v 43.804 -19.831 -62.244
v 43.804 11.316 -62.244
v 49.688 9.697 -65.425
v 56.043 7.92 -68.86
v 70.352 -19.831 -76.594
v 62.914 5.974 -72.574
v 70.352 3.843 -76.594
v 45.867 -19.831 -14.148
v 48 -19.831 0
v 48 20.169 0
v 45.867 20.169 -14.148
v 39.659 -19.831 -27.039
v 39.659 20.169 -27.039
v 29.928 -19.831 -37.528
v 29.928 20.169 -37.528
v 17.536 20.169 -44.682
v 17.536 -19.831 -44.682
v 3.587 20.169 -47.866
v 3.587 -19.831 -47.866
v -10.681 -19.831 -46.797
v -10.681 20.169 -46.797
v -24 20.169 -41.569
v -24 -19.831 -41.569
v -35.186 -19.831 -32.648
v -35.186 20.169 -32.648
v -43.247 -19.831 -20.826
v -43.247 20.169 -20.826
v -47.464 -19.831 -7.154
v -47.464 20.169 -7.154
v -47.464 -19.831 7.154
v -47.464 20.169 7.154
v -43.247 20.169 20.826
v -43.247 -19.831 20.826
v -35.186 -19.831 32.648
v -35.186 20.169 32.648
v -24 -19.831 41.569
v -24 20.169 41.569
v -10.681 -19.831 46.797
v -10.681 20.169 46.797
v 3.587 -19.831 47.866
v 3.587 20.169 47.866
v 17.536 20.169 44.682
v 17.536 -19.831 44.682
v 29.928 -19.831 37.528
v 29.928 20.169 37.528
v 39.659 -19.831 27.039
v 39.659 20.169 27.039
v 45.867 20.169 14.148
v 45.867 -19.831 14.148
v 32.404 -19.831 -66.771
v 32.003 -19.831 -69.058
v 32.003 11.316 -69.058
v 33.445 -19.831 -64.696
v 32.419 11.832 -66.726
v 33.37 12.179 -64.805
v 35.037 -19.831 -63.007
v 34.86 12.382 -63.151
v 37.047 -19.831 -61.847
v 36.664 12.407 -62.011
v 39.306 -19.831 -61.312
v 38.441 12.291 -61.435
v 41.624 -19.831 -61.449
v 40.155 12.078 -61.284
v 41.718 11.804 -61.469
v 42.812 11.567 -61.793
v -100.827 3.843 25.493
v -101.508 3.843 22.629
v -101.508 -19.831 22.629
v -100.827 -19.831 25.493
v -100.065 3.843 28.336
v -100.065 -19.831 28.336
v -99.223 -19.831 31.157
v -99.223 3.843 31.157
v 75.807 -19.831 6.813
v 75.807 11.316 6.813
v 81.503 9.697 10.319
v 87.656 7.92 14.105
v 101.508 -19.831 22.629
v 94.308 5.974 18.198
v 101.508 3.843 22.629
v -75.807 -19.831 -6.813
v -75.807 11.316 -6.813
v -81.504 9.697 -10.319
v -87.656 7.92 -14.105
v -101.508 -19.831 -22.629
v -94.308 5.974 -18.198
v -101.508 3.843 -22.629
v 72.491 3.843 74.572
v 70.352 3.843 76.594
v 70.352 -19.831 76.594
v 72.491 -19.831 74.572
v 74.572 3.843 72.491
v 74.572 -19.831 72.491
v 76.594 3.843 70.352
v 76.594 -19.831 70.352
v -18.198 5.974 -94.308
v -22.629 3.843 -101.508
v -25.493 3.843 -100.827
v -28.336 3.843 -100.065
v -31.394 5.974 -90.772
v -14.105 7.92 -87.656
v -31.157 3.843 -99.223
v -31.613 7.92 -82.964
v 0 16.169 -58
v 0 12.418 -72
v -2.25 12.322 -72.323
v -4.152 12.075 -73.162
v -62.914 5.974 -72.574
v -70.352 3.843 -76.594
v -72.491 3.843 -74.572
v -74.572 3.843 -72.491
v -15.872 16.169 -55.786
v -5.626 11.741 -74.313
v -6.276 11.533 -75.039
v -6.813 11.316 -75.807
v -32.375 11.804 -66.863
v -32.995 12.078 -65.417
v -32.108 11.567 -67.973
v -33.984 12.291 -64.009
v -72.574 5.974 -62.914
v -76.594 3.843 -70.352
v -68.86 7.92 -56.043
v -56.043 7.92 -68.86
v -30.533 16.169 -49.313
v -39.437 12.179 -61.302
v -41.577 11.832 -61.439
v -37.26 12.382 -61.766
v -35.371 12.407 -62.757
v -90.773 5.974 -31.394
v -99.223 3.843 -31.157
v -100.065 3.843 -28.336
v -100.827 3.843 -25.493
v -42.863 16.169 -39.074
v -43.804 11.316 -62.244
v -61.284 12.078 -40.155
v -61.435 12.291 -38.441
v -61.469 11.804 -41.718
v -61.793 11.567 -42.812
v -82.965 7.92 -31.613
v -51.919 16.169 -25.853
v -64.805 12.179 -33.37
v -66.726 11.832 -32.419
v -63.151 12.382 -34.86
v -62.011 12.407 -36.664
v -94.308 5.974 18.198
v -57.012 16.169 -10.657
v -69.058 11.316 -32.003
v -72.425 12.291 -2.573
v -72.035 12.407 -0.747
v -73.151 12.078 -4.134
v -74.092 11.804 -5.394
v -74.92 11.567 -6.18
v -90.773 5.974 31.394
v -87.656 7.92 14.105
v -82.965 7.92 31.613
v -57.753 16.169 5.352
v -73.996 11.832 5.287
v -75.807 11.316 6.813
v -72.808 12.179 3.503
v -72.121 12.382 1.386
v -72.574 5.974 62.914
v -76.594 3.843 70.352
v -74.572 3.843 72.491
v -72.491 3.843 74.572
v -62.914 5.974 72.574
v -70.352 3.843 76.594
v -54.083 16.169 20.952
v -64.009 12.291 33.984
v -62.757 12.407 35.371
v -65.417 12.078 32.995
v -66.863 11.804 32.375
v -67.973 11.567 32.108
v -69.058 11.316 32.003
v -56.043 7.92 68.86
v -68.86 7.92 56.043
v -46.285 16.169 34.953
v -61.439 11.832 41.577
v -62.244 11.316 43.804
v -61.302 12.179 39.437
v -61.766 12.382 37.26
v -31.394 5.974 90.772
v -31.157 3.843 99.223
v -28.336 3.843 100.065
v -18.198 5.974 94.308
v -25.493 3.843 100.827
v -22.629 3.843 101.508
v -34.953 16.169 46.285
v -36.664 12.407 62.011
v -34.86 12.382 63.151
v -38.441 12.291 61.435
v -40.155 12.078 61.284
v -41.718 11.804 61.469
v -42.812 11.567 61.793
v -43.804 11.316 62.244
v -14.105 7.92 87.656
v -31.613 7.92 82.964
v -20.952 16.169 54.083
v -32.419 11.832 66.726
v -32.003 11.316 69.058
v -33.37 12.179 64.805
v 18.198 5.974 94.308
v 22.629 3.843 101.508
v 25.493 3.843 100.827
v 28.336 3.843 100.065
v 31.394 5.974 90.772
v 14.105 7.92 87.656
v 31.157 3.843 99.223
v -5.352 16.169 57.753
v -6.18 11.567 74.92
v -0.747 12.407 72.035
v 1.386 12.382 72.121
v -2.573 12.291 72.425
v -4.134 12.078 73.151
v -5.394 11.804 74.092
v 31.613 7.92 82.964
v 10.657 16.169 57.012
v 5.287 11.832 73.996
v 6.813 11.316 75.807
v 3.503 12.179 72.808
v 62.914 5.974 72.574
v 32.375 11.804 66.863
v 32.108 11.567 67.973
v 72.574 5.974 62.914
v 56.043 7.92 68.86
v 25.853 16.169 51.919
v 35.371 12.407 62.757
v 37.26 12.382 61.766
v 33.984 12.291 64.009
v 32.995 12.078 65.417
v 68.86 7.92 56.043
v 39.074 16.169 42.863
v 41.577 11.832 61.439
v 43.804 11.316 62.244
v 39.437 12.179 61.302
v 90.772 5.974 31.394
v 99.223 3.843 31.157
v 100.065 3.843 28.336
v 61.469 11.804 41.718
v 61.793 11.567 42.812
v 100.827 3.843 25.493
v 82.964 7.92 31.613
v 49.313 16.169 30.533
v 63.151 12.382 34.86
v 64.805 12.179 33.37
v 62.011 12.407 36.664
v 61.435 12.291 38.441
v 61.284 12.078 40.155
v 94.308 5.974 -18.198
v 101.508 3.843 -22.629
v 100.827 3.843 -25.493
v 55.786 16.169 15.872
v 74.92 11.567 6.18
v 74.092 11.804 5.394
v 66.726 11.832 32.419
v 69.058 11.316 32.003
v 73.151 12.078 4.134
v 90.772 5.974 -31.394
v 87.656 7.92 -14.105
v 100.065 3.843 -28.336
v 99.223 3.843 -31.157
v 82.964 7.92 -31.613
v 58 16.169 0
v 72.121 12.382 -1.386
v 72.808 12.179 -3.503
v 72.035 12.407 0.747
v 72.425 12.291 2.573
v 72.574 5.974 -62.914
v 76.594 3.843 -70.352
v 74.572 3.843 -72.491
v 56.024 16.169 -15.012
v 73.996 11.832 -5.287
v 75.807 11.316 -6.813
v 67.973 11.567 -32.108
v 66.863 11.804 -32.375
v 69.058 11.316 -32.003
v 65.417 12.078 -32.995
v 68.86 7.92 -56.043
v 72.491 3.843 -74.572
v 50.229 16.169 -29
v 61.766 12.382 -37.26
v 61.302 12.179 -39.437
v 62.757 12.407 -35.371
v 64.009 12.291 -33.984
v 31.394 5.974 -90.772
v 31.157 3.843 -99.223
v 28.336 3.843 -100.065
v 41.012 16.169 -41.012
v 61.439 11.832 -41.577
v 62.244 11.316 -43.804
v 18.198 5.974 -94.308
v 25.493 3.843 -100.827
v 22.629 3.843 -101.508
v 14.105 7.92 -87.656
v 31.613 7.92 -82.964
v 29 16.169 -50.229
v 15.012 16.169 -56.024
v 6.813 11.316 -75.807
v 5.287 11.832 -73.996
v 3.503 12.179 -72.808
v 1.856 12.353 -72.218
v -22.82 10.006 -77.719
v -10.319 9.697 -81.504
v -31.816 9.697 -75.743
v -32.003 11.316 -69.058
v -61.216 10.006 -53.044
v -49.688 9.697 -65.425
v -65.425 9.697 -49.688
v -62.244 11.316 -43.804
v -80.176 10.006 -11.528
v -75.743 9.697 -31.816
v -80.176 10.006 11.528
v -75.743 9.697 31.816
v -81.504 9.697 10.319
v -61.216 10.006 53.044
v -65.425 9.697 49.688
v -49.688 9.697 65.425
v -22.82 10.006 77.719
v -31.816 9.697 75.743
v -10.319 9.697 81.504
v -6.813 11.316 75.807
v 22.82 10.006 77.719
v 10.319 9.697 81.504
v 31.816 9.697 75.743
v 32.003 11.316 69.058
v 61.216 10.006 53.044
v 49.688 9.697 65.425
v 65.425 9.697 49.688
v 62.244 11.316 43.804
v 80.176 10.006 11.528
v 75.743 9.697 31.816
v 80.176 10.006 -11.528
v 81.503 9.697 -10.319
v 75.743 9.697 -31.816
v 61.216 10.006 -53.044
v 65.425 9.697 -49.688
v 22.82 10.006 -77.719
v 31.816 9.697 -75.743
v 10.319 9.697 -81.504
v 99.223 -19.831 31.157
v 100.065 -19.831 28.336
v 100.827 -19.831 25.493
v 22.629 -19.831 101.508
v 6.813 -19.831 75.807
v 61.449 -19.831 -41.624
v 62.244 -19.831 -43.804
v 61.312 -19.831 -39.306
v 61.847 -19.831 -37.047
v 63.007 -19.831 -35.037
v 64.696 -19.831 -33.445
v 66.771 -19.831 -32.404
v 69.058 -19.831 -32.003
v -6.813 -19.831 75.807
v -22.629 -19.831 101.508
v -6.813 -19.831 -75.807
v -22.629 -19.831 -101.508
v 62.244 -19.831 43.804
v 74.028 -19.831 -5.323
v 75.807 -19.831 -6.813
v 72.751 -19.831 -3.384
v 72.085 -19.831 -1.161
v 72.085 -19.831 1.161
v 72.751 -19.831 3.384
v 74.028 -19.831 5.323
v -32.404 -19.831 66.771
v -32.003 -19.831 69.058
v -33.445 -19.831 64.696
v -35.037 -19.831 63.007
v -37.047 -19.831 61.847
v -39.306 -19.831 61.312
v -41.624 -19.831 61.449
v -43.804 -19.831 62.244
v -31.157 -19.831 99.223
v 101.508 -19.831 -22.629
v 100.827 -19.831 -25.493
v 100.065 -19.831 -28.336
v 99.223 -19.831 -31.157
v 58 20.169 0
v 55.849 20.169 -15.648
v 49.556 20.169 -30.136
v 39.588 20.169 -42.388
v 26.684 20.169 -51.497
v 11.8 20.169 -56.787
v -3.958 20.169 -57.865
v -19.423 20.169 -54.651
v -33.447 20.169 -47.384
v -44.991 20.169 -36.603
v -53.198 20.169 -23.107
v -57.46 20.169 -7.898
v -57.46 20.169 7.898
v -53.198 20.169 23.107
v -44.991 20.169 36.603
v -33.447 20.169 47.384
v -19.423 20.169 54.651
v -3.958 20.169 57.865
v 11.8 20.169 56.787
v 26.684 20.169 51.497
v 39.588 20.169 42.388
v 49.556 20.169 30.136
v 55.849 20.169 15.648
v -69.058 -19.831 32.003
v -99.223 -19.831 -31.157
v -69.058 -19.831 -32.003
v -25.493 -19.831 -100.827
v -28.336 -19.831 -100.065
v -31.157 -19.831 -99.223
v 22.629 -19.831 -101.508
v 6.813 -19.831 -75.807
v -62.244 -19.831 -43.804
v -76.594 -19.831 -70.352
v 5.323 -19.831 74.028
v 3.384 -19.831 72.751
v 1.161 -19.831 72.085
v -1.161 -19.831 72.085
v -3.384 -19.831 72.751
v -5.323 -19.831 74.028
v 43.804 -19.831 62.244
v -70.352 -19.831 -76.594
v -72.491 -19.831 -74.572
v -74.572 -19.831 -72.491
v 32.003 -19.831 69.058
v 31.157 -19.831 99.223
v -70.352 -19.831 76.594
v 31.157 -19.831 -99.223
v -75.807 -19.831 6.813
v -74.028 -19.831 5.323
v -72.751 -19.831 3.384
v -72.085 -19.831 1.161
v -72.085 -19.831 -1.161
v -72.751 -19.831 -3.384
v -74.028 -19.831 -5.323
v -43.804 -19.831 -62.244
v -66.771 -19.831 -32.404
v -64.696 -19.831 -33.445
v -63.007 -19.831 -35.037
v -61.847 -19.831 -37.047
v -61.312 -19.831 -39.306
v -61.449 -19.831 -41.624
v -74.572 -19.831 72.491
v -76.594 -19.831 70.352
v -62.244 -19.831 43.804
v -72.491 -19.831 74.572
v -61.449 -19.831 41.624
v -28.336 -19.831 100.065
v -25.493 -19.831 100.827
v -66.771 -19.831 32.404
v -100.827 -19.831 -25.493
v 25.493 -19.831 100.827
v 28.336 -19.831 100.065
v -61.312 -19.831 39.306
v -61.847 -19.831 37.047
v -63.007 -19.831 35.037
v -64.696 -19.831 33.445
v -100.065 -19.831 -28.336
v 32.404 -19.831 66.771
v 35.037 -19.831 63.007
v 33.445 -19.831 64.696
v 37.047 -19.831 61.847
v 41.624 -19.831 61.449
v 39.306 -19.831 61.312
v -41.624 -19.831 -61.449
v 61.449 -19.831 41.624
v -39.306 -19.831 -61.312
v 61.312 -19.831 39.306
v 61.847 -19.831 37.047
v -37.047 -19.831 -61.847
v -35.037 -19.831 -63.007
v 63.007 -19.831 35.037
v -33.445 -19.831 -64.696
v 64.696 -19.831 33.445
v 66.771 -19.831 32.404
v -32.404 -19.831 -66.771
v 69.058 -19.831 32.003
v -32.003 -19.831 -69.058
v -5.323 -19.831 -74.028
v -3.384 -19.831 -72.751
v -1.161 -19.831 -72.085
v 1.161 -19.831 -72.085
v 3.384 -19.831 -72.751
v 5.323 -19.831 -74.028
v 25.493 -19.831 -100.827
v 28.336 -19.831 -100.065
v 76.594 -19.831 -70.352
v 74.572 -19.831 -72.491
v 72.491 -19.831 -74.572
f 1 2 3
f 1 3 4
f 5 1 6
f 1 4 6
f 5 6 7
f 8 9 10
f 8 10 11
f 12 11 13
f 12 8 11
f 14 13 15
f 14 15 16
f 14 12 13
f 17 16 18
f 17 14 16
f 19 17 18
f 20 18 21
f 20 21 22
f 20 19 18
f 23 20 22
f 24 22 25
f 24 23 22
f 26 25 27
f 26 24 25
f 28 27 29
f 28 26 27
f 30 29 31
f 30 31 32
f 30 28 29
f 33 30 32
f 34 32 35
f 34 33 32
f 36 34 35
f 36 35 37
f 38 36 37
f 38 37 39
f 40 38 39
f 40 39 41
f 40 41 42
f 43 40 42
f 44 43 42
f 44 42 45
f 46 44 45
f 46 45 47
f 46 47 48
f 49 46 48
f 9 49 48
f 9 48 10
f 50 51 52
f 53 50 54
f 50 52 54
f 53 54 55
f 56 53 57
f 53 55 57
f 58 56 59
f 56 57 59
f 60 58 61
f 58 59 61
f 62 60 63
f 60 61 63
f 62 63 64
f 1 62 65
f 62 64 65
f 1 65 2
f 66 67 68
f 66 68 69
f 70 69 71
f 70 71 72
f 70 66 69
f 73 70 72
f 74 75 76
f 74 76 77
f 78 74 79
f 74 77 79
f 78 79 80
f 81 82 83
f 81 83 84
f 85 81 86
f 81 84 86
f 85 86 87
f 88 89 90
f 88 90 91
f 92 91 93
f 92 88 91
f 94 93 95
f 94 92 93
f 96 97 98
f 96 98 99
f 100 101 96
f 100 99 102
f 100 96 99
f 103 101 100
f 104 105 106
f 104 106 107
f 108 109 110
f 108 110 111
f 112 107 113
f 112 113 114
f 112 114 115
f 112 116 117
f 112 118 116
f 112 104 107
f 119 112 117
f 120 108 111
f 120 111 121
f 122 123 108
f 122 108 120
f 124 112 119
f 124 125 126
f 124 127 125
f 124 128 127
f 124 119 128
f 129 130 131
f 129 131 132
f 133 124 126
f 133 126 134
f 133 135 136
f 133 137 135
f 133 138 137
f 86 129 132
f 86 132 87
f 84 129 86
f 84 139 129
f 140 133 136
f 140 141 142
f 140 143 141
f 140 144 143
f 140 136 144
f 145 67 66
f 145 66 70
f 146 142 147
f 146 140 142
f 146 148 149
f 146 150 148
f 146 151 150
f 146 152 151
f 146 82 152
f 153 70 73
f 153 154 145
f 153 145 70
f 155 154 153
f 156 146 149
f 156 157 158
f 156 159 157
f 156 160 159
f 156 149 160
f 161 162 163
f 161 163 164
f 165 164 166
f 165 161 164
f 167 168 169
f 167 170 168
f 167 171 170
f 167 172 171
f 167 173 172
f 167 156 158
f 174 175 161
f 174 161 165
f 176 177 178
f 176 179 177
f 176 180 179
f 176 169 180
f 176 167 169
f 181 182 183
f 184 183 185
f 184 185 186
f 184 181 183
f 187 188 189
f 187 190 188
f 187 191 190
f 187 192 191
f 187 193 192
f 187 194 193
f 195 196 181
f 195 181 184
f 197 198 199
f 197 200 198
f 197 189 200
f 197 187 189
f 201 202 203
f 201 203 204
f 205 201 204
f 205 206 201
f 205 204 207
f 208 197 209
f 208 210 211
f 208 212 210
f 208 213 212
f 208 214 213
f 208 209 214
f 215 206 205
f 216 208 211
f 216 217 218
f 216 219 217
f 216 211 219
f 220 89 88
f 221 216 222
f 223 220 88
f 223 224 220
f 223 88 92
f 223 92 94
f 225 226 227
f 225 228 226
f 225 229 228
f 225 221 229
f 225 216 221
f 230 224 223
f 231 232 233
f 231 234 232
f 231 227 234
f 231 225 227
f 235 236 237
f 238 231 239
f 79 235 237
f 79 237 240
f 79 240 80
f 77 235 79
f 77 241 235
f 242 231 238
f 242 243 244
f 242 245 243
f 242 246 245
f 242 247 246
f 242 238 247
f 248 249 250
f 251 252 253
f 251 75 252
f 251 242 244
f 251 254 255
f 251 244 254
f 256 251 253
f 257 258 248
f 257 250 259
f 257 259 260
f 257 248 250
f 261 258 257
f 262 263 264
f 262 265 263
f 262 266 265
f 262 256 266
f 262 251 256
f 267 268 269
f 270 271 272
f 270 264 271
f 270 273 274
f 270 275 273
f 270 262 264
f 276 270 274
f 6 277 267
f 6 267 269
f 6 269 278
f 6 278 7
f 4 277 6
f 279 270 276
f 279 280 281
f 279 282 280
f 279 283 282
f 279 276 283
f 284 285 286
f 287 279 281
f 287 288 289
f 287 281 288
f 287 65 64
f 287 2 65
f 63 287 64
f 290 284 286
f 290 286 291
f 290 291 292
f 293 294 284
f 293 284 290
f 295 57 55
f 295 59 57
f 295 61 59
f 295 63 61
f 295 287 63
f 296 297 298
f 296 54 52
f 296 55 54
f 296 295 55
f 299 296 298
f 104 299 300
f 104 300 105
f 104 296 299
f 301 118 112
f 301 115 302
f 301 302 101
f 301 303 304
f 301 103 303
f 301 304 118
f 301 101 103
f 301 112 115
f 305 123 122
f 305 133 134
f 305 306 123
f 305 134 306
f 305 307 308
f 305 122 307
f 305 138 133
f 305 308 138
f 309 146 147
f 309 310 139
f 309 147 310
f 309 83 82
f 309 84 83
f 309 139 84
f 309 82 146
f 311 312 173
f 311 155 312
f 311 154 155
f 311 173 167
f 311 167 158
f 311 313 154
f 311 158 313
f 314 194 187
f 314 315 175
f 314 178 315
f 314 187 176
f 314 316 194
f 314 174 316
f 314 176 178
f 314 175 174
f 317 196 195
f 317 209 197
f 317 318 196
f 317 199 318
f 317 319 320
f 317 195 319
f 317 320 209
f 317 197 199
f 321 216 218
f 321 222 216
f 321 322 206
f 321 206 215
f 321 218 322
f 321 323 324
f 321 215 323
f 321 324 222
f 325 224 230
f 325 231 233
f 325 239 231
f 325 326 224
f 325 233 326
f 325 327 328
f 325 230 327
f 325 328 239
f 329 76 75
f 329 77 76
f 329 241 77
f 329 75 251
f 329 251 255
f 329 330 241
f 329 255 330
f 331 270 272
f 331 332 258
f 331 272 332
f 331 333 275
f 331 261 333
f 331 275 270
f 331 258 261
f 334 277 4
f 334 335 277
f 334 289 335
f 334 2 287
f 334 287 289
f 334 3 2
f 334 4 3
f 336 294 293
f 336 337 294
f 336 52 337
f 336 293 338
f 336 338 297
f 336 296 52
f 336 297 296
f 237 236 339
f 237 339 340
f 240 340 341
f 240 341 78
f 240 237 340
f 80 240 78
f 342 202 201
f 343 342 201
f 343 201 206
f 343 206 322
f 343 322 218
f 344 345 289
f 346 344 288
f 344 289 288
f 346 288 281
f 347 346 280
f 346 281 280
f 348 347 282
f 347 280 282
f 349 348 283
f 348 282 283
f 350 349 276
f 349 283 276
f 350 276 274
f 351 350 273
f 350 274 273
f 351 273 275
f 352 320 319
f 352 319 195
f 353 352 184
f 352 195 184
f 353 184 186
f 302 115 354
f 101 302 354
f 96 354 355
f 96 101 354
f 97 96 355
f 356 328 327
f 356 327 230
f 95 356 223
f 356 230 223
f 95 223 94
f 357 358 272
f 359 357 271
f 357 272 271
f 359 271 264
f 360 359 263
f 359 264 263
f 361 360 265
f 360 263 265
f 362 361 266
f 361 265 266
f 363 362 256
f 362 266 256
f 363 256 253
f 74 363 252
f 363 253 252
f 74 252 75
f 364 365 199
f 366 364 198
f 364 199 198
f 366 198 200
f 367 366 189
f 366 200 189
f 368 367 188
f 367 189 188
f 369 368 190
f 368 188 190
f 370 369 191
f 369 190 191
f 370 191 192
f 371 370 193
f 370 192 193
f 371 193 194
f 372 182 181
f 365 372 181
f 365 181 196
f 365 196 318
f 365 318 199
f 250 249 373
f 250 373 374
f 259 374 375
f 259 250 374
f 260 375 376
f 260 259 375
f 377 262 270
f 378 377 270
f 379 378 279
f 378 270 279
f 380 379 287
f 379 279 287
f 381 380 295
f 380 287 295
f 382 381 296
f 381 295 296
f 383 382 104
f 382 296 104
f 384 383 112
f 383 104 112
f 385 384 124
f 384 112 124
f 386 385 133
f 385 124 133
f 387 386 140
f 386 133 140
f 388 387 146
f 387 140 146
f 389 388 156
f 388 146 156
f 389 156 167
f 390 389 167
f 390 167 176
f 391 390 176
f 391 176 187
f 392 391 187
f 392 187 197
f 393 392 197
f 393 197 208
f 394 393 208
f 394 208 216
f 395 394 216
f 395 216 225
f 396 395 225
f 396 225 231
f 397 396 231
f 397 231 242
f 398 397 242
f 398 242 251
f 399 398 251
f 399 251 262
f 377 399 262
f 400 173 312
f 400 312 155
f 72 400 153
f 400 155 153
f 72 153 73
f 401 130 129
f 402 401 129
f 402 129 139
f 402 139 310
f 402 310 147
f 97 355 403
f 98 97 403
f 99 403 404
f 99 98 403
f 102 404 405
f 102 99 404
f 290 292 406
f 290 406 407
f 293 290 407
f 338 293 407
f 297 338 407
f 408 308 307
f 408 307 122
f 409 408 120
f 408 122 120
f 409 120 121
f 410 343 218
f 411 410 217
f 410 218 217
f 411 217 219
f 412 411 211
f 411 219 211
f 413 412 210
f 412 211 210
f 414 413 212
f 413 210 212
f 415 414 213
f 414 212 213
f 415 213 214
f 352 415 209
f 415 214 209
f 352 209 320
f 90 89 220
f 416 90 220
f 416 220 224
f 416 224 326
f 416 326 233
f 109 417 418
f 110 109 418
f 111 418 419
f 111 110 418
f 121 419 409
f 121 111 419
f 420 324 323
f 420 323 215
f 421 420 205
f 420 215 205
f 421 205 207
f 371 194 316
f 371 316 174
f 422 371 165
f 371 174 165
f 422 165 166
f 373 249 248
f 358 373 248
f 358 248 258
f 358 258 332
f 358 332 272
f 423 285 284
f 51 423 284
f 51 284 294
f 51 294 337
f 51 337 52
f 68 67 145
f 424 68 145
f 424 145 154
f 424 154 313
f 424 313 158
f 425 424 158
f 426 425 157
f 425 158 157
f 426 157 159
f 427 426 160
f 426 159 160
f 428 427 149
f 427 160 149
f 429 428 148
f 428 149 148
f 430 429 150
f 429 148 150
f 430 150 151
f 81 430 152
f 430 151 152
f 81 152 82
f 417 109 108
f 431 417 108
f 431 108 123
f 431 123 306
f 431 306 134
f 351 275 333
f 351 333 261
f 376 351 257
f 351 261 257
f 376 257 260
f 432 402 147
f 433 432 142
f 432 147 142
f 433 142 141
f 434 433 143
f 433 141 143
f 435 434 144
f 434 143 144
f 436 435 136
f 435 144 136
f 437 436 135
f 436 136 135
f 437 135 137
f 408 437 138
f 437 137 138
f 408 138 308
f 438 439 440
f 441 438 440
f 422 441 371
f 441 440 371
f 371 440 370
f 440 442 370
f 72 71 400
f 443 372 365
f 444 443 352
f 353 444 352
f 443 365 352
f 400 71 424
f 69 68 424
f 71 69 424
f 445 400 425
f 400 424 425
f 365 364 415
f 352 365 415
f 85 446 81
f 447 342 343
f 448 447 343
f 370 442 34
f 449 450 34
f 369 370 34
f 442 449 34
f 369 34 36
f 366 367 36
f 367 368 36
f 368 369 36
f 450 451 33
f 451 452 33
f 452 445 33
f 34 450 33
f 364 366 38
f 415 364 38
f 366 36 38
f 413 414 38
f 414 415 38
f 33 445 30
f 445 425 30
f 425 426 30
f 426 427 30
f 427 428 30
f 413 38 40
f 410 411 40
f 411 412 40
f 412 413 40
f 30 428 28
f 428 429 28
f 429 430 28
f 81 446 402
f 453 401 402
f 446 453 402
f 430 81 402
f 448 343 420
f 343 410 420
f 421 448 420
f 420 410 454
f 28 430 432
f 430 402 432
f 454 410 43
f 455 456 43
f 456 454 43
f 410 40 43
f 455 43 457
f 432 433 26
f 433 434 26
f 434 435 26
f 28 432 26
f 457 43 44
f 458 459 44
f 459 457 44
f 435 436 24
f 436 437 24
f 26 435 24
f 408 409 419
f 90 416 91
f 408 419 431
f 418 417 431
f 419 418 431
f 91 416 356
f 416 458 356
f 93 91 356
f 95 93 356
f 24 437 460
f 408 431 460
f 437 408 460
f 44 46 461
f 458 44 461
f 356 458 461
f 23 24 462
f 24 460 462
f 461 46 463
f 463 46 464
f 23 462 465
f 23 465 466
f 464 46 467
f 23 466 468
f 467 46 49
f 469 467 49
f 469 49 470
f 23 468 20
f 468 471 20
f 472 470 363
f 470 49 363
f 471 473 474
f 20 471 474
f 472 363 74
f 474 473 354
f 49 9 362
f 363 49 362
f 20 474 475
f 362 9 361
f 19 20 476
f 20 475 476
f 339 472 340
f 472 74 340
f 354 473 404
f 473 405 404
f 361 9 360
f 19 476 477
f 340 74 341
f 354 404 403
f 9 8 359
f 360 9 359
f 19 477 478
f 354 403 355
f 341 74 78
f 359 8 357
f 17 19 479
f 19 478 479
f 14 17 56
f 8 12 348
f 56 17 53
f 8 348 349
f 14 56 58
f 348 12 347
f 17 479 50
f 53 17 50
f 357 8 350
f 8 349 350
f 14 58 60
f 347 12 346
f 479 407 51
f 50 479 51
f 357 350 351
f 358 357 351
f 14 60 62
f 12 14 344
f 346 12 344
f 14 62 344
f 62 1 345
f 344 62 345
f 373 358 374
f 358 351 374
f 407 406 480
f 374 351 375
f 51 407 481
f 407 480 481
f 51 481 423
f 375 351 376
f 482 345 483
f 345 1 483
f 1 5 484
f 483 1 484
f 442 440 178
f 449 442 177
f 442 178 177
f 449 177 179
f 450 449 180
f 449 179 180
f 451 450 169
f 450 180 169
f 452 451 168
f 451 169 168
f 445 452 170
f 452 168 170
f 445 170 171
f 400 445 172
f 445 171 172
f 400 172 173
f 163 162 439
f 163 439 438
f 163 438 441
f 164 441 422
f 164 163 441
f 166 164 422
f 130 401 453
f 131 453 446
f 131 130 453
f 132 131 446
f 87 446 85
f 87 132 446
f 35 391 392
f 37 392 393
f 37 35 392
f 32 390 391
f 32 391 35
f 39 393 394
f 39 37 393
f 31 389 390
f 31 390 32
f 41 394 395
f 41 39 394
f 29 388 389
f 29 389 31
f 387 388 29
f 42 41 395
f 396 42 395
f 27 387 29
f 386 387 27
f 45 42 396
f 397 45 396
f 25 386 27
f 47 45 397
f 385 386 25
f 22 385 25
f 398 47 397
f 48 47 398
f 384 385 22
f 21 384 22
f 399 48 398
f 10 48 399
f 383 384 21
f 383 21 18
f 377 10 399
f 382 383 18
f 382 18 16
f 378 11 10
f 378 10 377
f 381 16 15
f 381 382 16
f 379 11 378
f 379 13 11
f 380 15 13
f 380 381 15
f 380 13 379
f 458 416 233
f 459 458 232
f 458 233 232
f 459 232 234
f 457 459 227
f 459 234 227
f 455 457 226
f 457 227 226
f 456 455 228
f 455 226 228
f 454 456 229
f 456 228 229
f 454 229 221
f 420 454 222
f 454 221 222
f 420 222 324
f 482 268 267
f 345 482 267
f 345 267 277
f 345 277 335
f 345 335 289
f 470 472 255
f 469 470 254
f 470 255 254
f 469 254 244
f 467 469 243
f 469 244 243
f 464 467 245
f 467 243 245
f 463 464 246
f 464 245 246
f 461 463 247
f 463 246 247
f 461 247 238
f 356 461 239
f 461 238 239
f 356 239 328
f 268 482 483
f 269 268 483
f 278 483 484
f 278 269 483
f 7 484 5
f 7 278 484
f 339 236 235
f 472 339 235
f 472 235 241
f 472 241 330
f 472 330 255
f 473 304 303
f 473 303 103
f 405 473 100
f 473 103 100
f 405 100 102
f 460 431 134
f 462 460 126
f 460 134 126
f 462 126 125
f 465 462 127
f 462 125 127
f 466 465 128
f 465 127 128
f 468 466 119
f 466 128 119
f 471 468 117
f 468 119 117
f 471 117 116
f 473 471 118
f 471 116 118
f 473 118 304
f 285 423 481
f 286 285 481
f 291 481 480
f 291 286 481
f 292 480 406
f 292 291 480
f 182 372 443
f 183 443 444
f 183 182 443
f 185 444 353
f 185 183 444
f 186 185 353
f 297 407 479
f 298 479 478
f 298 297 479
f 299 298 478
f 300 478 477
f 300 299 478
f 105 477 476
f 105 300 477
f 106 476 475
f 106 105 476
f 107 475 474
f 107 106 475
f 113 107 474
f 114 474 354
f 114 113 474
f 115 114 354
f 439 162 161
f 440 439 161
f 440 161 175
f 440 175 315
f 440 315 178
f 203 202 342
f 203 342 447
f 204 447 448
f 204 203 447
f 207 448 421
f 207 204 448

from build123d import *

# Parameters (mm, degrees)
SKETCH1_R               = 260
SKETCH1_R_2             = 120
BOSS_EXTRUDE1_DEPTH     = 45
SKETCH2_R               = 145
SKETCH2_R_2             = 120
BOSS_EXTRUDE3_DEPTH     = 55
CUT_EXTRUDE1_DEPTH      = 56
CUT_EXTRUDE1_DEPTH_BACK = 46
SCALE2_SCALE            = 0.4


with BuildPart() as part:
    # Sketch1 → Boss-Extrude1 (new body, symmetric)
    with BuildSketch(Plane(origin=(0, 0, 0), x_dir=(1, 0, 0), z_dir=(0, 1, 0))):
        Circle(SKETCH1_R)
        Circle(SKETCH1_R_2, mode=Mode.SUBTRACT)
    extrude(amount=BOSS_EXTRUDE1_DEPTH, both=True)

    # Sketch2 → Boss-Extrude3 (add)
    with BuildSketch(Plane(origin=(0, 0, 0), x_dir=(1, 0, 0), z_dir=(0, 1, 0))):
        Circle(SKETCH2_R)
        Circle(SKETCH2_R_2, mode=Mode.SUBTRACT)
    extrude(amount=BOSS_EXTRUDE3_DEPTH)

    # Sketch4 → Cut-Extrude1 (cut, two sides)
    with BuildSketch(Plane(origin=(0, 0, 0), x_dir=(1, 0, 0), z_dir=(0, 1, 0))) as cut_extrude1_sk:
        with BuildLine():
            Line((-17.033179487, 189.518072861), (-56.573051576, 253.770545642))
            ThreePointArc((-56.573051576, 253.770545642), (0, 260), (56.573051576, 253.770545642))
            Line((56.573051576, 253.770545642), (17.033179487, 189.518072861))
            ThreePointArc((17.033179487, 189.518072861), (0, 180), (-17.033179487, 189.518072861))
        make_face()
        with BuildLine():
            Line((109.510202574, 155.61087583), (175.878972656, 191.48521347))
            ThreePointArc((175.878972656, 191.48521347), (130, 225.166604984), (77.891572987, 248.058265046))
            Line((77.891572987, 248.058265046), (80.007870288, 172.644055317))
            ThreePointArc((80.007870288, 172.644055317), (90, 155.884572681), (109.510202574, 155.61087583))
        make_face()
        with BuildLine():
            Line((172.644055318, 80.007870287), (248.058265047, 77.891572986))
            ThreePointArc((248.058265047, 77.891572986), (225.166604985, 130), (191.485213471, 175.878972655))
            Line((191.485213471, 175.878972655), (155.610875831, 109.510202573))
            ThreePointArc((155.610875831, 109.510202573), (155.884572682, 90), (172.644055318, 80.007870287))
        make_face()
        with BuildLine():
            Line((189.518072862, -17.033179488), (253.770545643, -56.573051577))
            ThreePointArc((253.770545643, -56.573051577), (260.000000001, -1e-09), (253.770545643, 56.573051575))
            Line((253.770545643, 56.573051575), (189.518072862, 17.033179486))
            ThreePointArc((189.518072862, 17.033179486), (180.000000001, -1e-09), (189.518072862, -17.033179488))
        make_face()
        with BuildLine():
            Line((155.610875831, -109.510202575), (191.485213471, -175.878972657))
            ThreePointArc((191.485213471, -175.878972657), (225.166604985, -130.000000001), (248.058265047, -77.891572988))
            Line((248.058265047, -77.891572988), (172.644055318, -80.007870289))
            ThreePointArc((172.644055318, -80.007870289), (155.884572682, -90.000000001), (155.610875831, -109.510202575))
        make_face()
        with BuildLine():
            Line((80.007870288, -172.644055319), (77.891572987, -248.058265048))
            ThreePointArc((77.891572987, -248.058265048), (130, -225.166604986), (175.878972656, -191.485213472))
            Line((175.878972656, -191.485213472), (109.510202574, -155.610875832))
            ThreePointArc((109.510202574, -155.610875832), (90, -155.884572683), (80.007870288, -172.644055319))
        make_face()
        with BuildLine():
            Line((-17.033179487, -189.518072863), (-56.573051576, -253.770545644))
            ThreePointArc((-56.573051576, -253.770545644), (0, -260.000000002), (56.573051576, -253.770545644))
            Line((56.573051576, -253.770545644), (17.033179487, -189.518072863))
            ThreePointArc((17.033179487, -189.518072863), (0, -180.000000002), (-17.033179487, -189.518072863))
        make_face()
        with BuildLine():
            Line((-109.510202574, -155.610875832), (-175.878972656, -191.485213472))
            ThreePointArc((-175.878972656, -191.485213472), (-130, -225.166604986), (-77.891572987, -248.058265048))
            Line((-77.891572987, -248.058265048), (-80.007870288, -172.644055319))
            ThreePointArc((-80.007870288, -172.644055319), (-90, -155.884572683), (-109.510202574, -155.610875832))
        make_face()
        with BuildLine():
            Line((-172.644055318, -80.007870289), (-248.058265047, -77.891572988))
            ThreePointArc((-248.058265047, -77.891572988), (-225.166604985, -130.000000001), (-191.485213471, -175.878972657))
            Line((-191.485213471, -175.878972657), (-155.610875831, -109.510202575))
            ThreePointArc((-155.610875831, -109.510202575), (-155.884572682, -90.000000001), (-172.644055318, -80.007870289))
        make_face()
        with BuildLine():
            Line((-189.518072862, 17.033179486), (-253.770545643, 56.573051575))
            ThreePointArc((-253.770545643, 56.573051575), (-260.000000001, -1e-09), (-253.770545643, -56.573051577))
            Line((-253.770545643, -56.573051577), (-189.518072862, -17.033179488))
            ThreePointArc((-189.518072862, -17.033179488), (-180.000000001, -1e-09), (-189.518072862, 17.033179486))
        make_face()
        with BuildLine():
            Line((-155.610875831, 109.510202573), (-191.485213471, 175.878972655))
            ThreePointArc((-191.485213471, 175.878972655), (-225.166604985, 130), (-248.058265047, 77.891572986))
            Line((-248.058265047, 77.891572986), (-172.644055318, 80.007870287))
            ThreePointArc((-172.644055318, 80.007870287), (-155.884572682, 90), (-155.610875831, 109.510202573))
        make_face()
        with BuildLine():
            Line((-80.007870288, 172.644055317), (-77.891572987, 248.058265046))
            ThreePointArc((-77.891572987, 248.058265046), (-130, 225.166604984), (-175.878972656, 191.48521347))
            Line((-175.878972656, 191.48521347), (-109.510202574, 155.61087583))
            ThreePointArc((-109.510202574, 155.61087583), (-90, 155.884572681), (-80.007870288, 172.644055317))
        make_face()
    extrude(amount=CUT_EXTRUDE1_DEPTH, mode=Mode.SUBTRACT)
    extrude(cut_extrude1_sk.sketch, amount=-CUT_EXTRUDE1_DEPTH_BACK, mode=Mode.SUBTRACT)

    # Sketch9 → Cut-Revolve2 (revolve, cut)
    with BuildSketch(Plane(origin=(0, 0, 0), x_dir=(0, 0, -1), z_dir=(1, 0, 0))):
        Polygon((145, 45), (312.942286341, 45), (312.942286341, 0), align=None)
    revolve(axis=Axis((0, 0, 0), (0, 1, 0)), mode=Mode.SUBTRACT)


with BuildPart() as part_1:
    # Scale2: scaled about (-4.97e-06, -3.05192852, -9e-09)
    add(part.part.scale(SCALE2_SCALE).moved(Location((-2.982e-06, -1.831157112, -5e-09))))


solid = part_1.part
